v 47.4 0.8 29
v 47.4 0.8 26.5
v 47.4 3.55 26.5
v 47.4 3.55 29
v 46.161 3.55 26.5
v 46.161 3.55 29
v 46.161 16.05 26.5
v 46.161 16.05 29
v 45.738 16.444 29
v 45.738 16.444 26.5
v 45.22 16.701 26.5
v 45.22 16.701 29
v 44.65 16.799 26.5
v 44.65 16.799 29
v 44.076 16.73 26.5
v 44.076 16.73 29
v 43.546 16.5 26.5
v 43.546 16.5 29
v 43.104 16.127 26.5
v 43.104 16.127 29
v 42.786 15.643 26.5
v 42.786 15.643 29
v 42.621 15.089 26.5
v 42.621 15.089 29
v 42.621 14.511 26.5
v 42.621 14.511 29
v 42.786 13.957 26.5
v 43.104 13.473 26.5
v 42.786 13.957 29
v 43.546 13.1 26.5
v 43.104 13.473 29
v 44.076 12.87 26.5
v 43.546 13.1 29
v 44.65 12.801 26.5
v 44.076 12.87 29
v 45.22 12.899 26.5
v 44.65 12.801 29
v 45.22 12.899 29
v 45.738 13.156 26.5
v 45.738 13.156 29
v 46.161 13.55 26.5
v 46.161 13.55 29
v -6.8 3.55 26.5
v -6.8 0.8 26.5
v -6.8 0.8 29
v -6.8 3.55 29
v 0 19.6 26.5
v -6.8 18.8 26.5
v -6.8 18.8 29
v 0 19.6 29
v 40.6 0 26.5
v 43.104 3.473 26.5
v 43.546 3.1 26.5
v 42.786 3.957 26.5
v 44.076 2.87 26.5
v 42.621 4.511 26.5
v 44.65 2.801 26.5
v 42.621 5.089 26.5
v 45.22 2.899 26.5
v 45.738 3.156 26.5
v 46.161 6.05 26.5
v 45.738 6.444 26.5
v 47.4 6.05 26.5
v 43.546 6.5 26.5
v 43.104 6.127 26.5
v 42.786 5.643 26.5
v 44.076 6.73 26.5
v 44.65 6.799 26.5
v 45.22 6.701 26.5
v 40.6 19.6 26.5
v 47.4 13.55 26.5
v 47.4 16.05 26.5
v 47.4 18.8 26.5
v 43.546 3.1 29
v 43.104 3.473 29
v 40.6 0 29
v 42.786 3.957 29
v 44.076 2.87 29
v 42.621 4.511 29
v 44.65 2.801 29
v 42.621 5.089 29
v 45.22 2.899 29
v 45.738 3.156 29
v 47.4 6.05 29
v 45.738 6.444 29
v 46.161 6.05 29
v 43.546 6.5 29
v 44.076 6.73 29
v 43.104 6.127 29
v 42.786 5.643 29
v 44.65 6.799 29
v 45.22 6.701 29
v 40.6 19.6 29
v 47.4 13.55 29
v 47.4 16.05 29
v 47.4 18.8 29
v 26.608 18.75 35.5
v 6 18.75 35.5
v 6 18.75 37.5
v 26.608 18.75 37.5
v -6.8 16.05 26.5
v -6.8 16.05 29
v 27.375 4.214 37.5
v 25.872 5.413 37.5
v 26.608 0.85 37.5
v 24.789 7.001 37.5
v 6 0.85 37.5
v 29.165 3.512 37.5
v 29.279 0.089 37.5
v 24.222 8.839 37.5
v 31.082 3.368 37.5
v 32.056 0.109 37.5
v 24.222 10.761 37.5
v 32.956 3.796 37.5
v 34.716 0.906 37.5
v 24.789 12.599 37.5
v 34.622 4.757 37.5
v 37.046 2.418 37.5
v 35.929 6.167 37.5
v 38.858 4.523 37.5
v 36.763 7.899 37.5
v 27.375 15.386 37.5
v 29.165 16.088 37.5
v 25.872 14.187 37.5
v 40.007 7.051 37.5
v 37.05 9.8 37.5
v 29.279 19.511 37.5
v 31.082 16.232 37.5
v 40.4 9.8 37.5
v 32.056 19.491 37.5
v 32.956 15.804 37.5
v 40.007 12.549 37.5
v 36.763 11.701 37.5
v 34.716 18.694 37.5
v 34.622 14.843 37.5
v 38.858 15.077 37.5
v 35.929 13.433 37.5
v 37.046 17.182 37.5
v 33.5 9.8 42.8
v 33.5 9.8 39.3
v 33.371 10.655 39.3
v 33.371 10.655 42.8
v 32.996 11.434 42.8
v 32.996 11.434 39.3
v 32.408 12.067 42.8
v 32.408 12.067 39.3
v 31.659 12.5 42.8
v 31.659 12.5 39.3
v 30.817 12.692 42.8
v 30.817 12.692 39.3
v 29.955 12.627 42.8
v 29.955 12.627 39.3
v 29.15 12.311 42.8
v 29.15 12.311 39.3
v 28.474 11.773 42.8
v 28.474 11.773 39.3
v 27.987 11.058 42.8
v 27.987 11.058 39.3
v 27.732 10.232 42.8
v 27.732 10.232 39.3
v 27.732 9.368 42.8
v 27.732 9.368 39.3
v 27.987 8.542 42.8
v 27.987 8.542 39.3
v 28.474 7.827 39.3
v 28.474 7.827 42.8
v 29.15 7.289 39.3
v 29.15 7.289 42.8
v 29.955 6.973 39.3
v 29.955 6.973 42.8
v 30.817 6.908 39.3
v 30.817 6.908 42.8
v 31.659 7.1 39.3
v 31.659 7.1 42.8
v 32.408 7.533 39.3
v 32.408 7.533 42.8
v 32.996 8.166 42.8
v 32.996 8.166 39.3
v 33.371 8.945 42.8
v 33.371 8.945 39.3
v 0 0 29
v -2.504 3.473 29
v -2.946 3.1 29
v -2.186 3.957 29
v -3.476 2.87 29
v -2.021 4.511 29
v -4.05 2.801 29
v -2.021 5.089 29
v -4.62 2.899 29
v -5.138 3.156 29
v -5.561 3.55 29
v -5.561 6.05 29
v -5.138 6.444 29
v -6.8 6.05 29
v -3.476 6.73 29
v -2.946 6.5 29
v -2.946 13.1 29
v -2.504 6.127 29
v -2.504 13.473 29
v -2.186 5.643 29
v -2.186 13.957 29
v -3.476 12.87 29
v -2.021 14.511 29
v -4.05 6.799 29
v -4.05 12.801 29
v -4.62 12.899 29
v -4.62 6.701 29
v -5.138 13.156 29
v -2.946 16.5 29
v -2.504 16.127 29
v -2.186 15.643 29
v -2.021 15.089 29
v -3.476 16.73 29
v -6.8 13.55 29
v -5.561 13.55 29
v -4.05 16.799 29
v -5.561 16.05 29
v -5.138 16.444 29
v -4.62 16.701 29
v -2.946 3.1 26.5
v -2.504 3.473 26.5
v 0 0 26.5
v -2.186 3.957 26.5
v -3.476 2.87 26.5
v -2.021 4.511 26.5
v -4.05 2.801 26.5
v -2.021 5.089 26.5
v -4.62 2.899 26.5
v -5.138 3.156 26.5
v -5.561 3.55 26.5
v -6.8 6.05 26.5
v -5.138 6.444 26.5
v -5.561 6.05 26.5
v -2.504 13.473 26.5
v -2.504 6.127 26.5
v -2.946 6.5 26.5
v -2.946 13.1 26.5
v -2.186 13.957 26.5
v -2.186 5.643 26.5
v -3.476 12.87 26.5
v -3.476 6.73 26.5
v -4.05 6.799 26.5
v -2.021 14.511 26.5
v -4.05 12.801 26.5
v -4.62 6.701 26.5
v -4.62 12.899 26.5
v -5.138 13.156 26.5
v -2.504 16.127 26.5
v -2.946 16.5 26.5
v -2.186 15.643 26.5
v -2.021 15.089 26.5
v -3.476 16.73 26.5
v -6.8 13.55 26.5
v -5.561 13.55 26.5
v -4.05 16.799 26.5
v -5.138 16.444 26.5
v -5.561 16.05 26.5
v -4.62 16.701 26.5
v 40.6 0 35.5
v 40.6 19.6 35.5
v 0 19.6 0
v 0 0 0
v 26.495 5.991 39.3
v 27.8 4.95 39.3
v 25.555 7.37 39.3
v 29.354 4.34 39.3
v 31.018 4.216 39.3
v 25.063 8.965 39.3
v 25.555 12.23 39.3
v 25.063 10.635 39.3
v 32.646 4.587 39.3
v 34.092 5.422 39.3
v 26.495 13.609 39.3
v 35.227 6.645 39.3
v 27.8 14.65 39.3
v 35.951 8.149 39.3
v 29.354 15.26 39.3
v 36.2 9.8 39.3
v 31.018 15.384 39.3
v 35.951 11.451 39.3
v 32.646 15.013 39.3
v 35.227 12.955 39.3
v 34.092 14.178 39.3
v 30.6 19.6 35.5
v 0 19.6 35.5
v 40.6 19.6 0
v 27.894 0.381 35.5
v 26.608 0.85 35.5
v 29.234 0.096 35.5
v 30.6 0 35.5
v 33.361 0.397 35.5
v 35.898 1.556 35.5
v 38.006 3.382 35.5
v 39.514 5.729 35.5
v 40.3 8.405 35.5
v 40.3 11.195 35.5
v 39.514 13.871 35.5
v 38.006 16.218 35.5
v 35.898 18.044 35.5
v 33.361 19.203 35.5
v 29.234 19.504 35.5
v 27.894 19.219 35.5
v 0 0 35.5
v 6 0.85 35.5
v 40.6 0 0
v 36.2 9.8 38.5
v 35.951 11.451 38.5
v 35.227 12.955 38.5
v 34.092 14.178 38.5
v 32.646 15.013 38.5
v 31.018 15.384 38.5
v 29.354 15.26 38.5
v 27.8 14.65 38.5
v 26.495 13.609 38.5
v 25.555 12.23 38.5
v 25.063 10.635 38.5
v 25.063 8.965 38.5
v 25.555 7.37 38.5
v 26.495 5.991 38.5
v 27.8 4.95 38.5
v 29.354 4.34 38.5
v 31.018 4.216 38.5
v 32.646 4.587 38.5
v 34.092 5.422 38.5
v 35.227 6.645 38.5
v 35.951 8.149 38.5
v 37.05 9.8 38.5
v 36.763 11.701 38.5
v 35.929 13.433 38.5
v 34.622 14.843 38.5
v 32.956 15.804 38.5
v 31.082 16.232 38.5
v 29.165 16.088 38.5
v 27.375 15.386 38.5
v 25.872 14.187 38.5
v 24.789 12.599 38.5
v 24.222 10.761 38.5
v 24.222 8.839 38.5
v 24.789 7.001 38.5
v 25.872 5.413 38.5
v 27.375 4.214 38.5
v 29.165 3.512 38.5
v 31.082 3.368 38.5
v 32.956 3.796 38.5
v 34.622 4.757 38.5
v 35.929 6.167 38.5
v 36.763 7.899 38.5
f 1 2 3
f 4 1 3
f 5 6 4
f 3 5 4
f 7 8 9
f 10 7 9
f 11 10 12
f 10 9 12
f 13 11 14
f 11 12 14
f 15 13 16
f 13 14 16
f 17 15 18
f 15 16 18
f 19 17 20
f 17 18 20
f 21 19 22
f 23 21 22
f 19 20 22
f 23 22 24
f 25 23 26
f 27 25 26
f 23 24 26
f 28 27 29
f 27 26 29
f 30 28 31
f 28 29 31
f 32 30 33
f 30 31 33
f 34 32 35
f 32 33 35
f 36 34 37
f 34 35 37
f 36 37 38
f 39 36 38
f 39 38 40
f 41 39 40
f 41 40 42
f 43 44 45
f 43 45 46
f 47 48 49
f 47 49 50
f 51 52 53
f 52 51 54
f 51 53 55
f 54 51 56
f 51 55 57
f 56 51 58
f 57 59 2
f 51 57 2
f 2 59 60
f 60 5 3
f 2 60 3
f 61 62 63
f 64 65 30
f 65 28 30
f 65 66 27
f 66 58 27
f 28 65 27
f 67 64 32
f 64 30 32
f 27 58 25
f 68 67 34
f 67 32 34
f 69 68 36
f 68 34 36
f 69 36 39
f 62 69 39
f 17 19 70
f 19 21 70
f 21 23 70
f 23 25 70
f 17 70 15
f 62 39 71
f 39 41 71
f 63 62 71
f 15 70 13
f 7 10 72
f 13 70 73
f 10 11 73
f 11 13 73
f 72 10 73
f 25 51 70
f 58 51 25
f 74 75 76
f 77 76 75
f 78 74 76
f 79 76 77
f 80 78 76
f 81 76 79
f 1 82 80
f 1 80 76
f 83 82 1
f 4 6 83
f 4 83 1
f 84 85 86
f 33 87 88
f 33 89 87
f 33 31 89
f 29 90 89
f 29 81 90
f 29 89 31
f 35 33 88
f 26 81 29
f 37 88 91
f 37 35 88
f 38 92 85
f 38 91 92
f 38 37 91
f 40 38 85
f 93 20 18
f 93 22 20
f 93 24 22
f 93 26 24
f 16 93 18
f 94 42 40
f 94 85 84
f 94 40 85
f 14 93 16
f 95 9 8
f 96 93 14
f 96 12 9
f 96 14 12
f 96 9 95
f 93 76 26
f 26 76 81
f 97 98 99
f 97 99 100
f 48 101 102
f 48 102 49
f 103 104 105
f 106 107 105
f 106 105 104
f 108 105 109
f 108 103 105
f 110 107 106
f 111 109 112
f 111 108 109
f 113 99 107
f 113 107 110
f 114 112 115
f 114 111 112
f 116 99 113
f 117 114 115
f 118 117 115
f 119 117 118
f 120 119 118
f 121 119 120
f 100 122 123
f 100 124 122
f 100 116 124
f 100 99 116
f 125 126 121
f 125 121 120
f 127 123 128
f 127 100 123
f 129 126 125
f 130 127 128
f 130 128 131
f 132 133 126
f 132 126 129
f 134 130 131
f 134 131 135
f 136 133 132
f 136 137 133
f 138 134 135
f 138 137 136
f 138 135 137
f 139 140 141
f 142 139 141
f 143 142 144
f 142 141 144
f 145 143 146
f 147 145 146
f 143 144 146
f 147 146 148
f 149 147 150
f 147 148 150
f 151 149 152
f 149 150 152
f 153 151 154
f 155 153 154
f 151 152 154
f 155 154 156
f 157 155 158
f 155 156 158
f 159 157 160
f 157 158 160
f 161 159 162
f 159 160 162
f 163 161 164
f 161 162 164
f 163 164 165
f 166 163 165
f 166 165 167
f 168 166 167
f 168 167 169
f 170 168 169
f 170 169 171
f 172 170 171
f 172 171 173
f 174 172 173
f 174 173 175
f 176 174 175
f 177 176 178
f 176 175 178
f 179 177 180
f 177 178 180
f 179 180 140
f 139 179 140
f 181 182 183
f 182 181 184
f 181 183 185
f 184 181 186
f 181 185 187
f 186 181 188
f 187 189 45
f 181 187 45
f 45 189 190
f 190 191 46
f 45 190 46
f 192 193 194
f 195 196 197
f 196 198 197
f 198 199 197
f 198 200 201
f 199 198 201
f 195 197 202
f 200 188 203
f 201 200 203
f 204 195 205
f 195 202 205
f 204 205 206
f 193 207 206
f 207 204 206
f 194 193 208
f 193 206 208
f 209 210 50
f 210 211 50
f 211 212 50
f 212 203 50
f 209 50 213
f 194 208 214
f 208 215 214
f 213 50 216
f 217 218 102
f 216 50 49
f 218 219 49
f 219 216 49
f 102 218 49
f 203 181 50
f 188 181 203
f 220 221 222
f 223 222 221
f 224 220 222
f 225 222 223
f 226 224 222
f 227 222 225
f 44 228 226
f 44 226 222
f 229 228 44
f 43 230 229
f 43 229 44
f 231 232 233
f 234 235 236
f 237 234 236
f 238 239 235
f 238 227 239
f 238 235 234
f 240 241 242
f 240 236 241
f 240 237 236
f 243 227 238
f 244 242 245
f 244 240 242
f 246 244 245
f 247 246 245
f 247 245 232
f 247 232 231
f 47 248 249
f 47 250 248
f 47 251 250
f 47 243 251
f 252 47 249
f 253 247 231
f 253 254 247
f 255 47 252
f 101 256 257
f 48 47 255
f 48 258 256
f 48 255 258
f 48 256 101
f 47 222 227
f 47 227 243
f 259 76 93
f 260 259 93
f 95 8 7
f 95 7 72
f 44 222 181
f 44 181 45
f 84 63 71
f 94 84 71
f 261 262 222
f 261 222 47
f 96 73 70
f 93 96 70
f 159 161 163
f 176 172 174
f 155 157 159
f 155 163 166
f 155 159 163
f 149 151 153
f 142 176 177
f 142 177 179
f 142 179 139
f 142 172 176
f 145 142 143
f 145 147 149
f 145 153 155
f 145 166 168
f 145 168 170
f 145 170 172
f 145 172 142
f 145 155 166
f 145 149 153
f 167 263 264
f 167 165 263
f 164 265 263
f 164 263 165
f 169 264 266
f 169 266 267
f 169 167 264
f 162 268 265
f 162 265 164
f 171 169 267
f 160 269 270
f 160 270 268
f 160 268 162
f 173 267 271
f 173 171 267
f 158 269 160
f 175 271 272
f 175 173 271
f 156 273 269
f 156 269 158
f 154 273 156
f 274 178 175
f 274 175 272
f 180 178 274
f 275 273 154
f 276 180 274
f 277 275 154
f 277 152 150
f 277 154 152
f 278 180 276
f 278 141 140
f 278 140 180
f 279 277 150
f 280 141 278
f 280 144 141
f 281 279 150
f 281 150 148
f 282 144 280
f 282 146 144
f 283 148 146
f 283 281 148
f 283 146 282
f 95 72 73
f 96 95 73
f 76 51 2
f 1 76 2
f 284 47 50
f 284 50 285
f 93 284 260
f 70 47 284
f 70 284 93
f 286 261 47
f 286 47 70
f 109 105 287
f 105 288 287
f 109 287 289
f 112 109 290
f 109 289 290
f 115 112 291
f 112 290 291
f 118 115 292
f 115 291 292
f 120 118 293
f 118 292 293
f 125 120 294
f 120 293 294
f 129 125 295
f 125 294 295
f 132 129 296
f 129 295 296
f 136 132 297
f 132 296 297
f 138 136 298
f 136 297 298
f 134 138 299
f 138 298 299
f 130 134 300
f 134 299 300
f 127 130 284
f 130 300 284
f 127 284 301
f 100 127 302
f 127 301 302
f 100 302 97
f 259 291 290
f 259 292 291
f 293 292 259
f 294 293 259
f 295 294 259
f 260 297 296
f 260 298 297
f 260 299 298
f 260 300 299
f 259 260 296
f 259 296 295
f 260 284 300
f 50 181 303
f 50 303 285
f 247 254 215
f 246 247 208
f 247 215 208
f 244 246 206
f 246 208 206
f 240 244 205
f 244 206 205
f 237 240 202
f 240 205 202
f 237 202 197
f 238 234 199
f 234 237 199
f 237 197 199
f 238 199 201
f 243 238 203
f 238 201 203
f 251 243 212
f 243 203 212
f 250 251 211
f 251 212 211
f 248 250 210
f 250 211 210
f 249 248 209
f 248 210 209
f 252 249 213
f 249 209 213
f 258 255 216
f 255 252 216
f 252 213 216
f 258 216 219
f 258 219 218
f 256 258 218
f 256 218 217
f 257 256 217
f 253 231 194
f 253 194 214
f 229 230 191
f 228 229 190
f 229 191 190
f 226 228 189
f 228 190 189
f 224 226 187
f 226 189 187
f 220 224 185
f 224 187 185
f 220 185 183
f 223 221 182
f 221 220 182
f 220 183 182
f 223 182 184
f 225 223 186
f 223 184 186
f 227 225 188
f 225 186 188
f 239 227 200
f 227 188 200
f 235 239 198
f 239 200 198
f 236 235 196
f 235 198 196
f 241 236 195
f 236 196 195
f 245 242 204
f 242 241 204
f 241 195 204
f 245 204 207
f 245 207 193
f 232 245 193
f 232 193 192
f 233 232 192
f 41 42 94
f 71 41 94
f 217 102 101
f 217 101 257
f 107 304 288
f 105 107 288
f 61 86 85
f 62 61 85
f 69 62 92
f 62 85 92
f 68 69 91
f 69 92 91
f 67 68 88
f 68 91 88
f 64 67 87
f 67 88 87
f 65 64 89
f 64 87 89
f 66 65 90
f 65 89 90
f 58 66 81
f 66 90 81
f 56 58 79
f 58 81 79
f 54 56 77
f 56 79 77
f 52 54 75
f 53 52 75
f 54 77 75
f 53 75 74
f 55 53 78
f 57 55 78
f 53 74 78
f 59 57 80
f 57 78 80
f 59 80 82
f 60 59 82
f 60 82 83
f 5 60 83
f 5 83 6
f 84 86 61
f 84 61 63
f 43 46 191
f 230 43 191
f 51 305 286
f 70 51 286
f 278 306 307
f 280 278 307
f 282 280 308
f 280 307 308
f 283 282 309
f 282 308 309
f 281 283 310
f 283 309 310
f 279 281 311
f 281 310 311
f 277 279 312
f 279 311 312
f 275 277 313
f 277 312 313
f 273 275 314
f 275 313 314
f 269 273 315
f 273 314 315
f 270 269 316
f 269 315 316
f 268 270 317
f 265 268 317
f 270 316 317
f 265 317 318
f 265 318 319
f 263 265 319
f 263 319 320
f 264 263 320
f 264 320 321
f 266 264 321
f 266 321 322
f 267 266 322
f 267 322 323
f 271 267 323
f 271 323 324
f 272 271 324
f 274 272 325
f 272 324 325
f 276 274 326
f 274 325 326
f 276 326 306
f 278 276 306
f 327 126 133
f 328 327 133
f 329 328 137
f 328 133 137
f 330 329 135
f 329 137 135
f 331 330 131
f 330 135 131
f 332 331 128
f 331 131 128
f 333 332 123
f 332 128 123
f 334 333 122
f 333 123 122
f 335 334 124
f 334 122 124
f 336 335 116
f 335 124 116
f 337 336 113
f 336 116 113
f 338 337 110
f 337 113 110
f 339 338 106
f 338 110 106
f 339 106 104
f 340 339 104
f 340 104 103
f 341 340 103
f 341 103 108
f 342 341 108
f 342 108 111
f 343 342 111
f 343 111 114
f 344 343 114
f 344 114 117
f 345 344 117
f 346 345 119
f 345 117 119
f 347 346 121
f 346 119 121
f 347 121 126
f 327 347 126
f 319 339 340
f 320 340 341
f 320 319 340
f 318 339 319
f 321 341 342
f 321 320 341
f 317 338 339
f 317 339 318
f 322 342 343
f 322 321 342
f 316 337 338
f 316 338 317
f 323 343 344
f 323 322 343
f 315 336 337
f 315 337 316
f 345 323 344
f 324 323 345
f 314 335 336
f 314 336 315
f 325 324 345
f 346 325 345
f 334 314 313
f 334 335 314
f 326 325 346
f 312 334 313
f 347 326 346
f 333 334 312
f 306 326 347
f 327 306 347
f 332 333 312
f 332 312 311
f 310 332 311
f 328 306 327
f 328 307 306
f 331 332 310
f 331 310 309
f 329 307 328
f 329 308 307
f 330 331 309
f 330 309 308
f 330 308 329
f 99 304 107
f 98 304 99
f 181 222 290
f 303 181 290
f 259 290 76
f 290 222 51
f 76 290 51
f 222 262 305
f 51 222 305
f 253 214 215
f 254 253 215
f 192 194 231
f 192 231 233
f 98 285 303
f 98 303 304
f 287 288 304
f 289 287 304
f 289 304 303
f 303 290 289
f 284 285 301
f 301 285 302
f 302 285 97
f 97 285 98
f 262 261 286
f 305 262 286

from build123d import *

# Parameters (mm, degrees)
SKETCH_1_W          = 40.6
SKETCH_1_H          = 19.6
EXTRUDE_1_DEPTH     = 35.5
SKETCH_2_R          = 9.8
EXTRUDE_2_DEPTH     = 2
SKETCH_3_W          = 20.607820144
SKETCH_3_H          = 17.9
EXTRUDE_3_DEPTH     = 2
SKETCH_4_R          = 6.45
EXTRUDE_4_DEPTH     = 1
SKETCH_5_R          = 5.6
EXTRUDE_5_DEPTH     = 0.8
SKETCH_7_R          = 2.9
EXTRUDE_6_DEPTH     = 3.5
EXTRUDE_7_DEPTH     = 2.5
CUT_EXTRUDE_1_REACH = 31
SKETCH_9_R          = 2
CUT_EXTRUDE_2_REACH = 31
SKETCH_10_W         = 1.6
SKETCH_10_H         = 2.5


with BuildPart() as part:
    # ｽｹｯﾁ1 → ﾎﾞｽ - 押し出し1 (new body)
    with BuildSketch(Plane.XY):
        with Locations((20.3, 9.8)):
            Rectangle(SKETCH_1_W, SKETCH_1_H)
    extrude(amount=EXTRUDE_1_DEPTH)

    # ｽｹｯﾁ2 → ﾎﾞｽ - 押し出し2 (add)
    with BuildSketch(Plane.XY.offset(35.5)):
        with Locations((30.6, 9.8)):
            Circle(SKETCH_2_R)
    extrude(amount=EXTRUDE_2_DEPTH)

    # ｽｹｯﾁ3 → ﾎﾞｽ - 押し出し3 (add)
    with BuildSketch(Plane.XY.offset(35.5)):
        with Locations((16.303910072, 9.8)):
            Rectangle(SKETCH_3_W, SKETCH_3_H)
    extrude(amount=EXTRUDE_3_DEPTH)

    # ｽｹｯﾁ4 → ﾎﾞｽ - 押し出し4 (add)
    with BuildSketch(Plane.XY.offset(37.5)):
        with Locations((30.6, 9.8)):
            Circle(SKETCH_4_R)
    extrude(amount=EXTRUDE_4_DEPTH)

    # ｽｹｯﾁ5 → ﾎﾞｽ - 押し出し5 (add)
    with BuildSketch(Plane.XY.offset(38.5)):
        with Locations((30.6, 9.8)):
            Circle(SKETCH_5_R)
    extrude(amount=EXTRUDE_5_DEPTH)

    # ｽｹｯﾁ7 → ﾎﾞｽ - 押し出し6 (add)
    with BuildSketch(Plane.XY.offset(39.3)):
        with Locations((30.6, 9.8)):
            Circle(SKETCH_7_R)
    extrude(amount=EXTRUDE_6_DEPTH)

    # ｽｹｯﾁ8 → ﾎﾞｽ - 押し出し7 (add)
    with BuildSketch(Plane.XY.offset(26.5)):
        Polygon((0, 0), (-6.8, 0.8), (-6.8, 18.8), (0, 19.6), align=None)
        Polygon((40.6, 19.6), (40.6, 0), (47.4, 0.8), (47.4, 18.8), align=None)
    extrude(amount=EXTRUDE_7_DEPTH)

    # ｽｹｯﾁ9 → ｶｯﾄ - 押し出し1 (cut, up to next)
    with BuildSketch(Plane.XY.offset(29), mode=Mode.PRIVATE) as cut_extrude_1_sk1:
        with Locations((-4, 4.8)):
            Circle(SKETCH_9_R)
    cut_extrude_1_tool1 = extrude(cut_extrude_1_sk1.sketch, amount=-CUT_EXTRUDE_1_REACH, mode=Mode.PRIVATE) & part.part
    add(cut_extrude_1_tool1.solids().sort_by_distance((-4, 4.8, 29))[0], mode=Mode.SUBTRACT)
    # ｽｹｯﾁ9 → ｶｯﾄ - 押し出し1 (cut, up to next)
    with BuildSketch(Plane.XY.offset(29), mode=Mode.PRIVATE) as cut_extrude_1_sk2:
        with Locations((-4, 14.8)):
            Circle(SKETCH_9_R)
    cut_extrude_1_tool2 = extrude(cut_extrude_1_sk2.sketch, amount=-CUT_EXTRUDE_1_REACH, mode=Mode.PRIVATE) & part.part
    add(cut_extrude_1_tool2.solids().sort_by_distance((-4, 14.8, 29))[0], mode=Mode.SUBTRACT)
    # ｽｹｯﾁ9 → ｶｯﾄ - 押し出し1 (cut, up to next)
    with BuildSketch(Plane.XY.offset(29), mode=Mode.PRIVATE) as cut_extrude_1_sk3:
        with Locations((44.6, 14.8)):
            Circle(SKETCH_9_R)
    cut_extrude_1_tool3 = extrude(cut_extrude_1_sk3.sketch, amount=-CUT_EXTRUDE_1_REACH, mode=Mode.PRIVATE) & part.part
    add(cut_extrude_1_tool3.solids().sort_by_distance((44.6, 14.8, 29))[0], mode=Mode.SUBTRACT)
    # ｽｹｯﾁ9 → ｶｯﾄ - 押し出し1 (cut, up to next)
    with BuildSketch(Plane.XY.offset(29), mode=Mode.PRIVATE) as cut_extrude_1_sk4:
        with Locations((44.6, 4.8)):
            Circle(SKETCH_9_R)
    cut_extrude_1_tool4 = extrude(cut_extrude_1_sk4.sketch, amount=-CUT_EXTRUDE_1_REACH, mode=Mode.PRIVATE) & part.part
    add(cut_extrude_1_tool4.solids().sort_by_distance((44.6, 4.8, 29))[0], mode=Mode.SUBTRACT)

    # ｽｹｯﾁ10 → ｶｯﾄ - 押し出し2 (cut, up to next)
    with BuildSketch(Plane.XY.offset(29), mode=Mode.PRIVATE) as cut_extrude_2_sk1:
        with Locations((-6, 4.8)):
            Rectangle(SKETCH_10_W, SKETCH_10_H)
    cut_extrude_2_tool1 = extrude(cut_extrude_2_sk1.sketch, amount=-CUT_EXTRUDE_2_REACH, mode=Mode.PRIVATE) & part.part
    add(cut_extrude_2_tool1.solids().sort_by_distance((-6, 4.8, 29))[0], mode=Mode.SUBTRACT)
    # ｽｹｯﾁ10 → ｶｯﾄ - 押し出し2 (cut, up to next)
    with BuildSketch(Plane.XY.offset(29), mode=Mode.PRIVATE) as cut_extrude_2_sk2:
        with Locations((-6, 14.8)):
            Rectangle(SKETCH_10_W, SKETCH_10_H)
    cut_extrude_2_tool2 = extrude(cut_extrude_2_sk2.sketch, amount=-CUT_EXTRUDE_2_REACH, mode=Mode.PRIVATE) & part.part
    add(cut_extrude_2_tool2.solids().sort_by_distance((-6, 14.8, 29))[0], mode=Mode.SUBTRACT)
    # ｽｹｯﾁ10 → ｶｯﾄ - 押し出し2 (cut, up to next)
    with BuildSketch(Plane.XY.offset(29), mode=Mode.PRIVATE) as cut_extrude_2_sk3:
        with Locations((46.6, 14.8)):
            Rectangle(SKETCH_10_W, SKETCH_10_H)
    cut_extrude_2_tool3 = extrude(cut_extrude_2_sk3.sketch, amount=-CUT_EXTRUDE_2_REACH, mode=Mode.PRIVATE) & part.part
    add(cut_extrude_2_tool3.solids().sort_by_distance((46.6, 14.8, 29))[0], mode=Mode.SUBTRACT)
    # ｽｹｯﾁ10 → ｶｯﾄ - 押し出し2 (cut, up to next)
    with BuildSketch(Plane.XY.offset(29), mode=Mode.PRIVATE) as cut_extrude_2_sk4:
        with Locations((46.6, 4.8)):
            Rectangle(SKETCH_10_W, SKETCH_10_H)
    cut_extrude_2_tool4 = extrude(cut_extrude_2_sk4.sketch, amount=-CUT_EXTRUDE_2_REACH, mode=Mode.PRIVATE) & part.part
    add(cut_extrude_2_tool4.solids().sort_by_distance((46.6, 4.8, 29))[0], mode=Mode.SUBTRACT)


solid = part.part
